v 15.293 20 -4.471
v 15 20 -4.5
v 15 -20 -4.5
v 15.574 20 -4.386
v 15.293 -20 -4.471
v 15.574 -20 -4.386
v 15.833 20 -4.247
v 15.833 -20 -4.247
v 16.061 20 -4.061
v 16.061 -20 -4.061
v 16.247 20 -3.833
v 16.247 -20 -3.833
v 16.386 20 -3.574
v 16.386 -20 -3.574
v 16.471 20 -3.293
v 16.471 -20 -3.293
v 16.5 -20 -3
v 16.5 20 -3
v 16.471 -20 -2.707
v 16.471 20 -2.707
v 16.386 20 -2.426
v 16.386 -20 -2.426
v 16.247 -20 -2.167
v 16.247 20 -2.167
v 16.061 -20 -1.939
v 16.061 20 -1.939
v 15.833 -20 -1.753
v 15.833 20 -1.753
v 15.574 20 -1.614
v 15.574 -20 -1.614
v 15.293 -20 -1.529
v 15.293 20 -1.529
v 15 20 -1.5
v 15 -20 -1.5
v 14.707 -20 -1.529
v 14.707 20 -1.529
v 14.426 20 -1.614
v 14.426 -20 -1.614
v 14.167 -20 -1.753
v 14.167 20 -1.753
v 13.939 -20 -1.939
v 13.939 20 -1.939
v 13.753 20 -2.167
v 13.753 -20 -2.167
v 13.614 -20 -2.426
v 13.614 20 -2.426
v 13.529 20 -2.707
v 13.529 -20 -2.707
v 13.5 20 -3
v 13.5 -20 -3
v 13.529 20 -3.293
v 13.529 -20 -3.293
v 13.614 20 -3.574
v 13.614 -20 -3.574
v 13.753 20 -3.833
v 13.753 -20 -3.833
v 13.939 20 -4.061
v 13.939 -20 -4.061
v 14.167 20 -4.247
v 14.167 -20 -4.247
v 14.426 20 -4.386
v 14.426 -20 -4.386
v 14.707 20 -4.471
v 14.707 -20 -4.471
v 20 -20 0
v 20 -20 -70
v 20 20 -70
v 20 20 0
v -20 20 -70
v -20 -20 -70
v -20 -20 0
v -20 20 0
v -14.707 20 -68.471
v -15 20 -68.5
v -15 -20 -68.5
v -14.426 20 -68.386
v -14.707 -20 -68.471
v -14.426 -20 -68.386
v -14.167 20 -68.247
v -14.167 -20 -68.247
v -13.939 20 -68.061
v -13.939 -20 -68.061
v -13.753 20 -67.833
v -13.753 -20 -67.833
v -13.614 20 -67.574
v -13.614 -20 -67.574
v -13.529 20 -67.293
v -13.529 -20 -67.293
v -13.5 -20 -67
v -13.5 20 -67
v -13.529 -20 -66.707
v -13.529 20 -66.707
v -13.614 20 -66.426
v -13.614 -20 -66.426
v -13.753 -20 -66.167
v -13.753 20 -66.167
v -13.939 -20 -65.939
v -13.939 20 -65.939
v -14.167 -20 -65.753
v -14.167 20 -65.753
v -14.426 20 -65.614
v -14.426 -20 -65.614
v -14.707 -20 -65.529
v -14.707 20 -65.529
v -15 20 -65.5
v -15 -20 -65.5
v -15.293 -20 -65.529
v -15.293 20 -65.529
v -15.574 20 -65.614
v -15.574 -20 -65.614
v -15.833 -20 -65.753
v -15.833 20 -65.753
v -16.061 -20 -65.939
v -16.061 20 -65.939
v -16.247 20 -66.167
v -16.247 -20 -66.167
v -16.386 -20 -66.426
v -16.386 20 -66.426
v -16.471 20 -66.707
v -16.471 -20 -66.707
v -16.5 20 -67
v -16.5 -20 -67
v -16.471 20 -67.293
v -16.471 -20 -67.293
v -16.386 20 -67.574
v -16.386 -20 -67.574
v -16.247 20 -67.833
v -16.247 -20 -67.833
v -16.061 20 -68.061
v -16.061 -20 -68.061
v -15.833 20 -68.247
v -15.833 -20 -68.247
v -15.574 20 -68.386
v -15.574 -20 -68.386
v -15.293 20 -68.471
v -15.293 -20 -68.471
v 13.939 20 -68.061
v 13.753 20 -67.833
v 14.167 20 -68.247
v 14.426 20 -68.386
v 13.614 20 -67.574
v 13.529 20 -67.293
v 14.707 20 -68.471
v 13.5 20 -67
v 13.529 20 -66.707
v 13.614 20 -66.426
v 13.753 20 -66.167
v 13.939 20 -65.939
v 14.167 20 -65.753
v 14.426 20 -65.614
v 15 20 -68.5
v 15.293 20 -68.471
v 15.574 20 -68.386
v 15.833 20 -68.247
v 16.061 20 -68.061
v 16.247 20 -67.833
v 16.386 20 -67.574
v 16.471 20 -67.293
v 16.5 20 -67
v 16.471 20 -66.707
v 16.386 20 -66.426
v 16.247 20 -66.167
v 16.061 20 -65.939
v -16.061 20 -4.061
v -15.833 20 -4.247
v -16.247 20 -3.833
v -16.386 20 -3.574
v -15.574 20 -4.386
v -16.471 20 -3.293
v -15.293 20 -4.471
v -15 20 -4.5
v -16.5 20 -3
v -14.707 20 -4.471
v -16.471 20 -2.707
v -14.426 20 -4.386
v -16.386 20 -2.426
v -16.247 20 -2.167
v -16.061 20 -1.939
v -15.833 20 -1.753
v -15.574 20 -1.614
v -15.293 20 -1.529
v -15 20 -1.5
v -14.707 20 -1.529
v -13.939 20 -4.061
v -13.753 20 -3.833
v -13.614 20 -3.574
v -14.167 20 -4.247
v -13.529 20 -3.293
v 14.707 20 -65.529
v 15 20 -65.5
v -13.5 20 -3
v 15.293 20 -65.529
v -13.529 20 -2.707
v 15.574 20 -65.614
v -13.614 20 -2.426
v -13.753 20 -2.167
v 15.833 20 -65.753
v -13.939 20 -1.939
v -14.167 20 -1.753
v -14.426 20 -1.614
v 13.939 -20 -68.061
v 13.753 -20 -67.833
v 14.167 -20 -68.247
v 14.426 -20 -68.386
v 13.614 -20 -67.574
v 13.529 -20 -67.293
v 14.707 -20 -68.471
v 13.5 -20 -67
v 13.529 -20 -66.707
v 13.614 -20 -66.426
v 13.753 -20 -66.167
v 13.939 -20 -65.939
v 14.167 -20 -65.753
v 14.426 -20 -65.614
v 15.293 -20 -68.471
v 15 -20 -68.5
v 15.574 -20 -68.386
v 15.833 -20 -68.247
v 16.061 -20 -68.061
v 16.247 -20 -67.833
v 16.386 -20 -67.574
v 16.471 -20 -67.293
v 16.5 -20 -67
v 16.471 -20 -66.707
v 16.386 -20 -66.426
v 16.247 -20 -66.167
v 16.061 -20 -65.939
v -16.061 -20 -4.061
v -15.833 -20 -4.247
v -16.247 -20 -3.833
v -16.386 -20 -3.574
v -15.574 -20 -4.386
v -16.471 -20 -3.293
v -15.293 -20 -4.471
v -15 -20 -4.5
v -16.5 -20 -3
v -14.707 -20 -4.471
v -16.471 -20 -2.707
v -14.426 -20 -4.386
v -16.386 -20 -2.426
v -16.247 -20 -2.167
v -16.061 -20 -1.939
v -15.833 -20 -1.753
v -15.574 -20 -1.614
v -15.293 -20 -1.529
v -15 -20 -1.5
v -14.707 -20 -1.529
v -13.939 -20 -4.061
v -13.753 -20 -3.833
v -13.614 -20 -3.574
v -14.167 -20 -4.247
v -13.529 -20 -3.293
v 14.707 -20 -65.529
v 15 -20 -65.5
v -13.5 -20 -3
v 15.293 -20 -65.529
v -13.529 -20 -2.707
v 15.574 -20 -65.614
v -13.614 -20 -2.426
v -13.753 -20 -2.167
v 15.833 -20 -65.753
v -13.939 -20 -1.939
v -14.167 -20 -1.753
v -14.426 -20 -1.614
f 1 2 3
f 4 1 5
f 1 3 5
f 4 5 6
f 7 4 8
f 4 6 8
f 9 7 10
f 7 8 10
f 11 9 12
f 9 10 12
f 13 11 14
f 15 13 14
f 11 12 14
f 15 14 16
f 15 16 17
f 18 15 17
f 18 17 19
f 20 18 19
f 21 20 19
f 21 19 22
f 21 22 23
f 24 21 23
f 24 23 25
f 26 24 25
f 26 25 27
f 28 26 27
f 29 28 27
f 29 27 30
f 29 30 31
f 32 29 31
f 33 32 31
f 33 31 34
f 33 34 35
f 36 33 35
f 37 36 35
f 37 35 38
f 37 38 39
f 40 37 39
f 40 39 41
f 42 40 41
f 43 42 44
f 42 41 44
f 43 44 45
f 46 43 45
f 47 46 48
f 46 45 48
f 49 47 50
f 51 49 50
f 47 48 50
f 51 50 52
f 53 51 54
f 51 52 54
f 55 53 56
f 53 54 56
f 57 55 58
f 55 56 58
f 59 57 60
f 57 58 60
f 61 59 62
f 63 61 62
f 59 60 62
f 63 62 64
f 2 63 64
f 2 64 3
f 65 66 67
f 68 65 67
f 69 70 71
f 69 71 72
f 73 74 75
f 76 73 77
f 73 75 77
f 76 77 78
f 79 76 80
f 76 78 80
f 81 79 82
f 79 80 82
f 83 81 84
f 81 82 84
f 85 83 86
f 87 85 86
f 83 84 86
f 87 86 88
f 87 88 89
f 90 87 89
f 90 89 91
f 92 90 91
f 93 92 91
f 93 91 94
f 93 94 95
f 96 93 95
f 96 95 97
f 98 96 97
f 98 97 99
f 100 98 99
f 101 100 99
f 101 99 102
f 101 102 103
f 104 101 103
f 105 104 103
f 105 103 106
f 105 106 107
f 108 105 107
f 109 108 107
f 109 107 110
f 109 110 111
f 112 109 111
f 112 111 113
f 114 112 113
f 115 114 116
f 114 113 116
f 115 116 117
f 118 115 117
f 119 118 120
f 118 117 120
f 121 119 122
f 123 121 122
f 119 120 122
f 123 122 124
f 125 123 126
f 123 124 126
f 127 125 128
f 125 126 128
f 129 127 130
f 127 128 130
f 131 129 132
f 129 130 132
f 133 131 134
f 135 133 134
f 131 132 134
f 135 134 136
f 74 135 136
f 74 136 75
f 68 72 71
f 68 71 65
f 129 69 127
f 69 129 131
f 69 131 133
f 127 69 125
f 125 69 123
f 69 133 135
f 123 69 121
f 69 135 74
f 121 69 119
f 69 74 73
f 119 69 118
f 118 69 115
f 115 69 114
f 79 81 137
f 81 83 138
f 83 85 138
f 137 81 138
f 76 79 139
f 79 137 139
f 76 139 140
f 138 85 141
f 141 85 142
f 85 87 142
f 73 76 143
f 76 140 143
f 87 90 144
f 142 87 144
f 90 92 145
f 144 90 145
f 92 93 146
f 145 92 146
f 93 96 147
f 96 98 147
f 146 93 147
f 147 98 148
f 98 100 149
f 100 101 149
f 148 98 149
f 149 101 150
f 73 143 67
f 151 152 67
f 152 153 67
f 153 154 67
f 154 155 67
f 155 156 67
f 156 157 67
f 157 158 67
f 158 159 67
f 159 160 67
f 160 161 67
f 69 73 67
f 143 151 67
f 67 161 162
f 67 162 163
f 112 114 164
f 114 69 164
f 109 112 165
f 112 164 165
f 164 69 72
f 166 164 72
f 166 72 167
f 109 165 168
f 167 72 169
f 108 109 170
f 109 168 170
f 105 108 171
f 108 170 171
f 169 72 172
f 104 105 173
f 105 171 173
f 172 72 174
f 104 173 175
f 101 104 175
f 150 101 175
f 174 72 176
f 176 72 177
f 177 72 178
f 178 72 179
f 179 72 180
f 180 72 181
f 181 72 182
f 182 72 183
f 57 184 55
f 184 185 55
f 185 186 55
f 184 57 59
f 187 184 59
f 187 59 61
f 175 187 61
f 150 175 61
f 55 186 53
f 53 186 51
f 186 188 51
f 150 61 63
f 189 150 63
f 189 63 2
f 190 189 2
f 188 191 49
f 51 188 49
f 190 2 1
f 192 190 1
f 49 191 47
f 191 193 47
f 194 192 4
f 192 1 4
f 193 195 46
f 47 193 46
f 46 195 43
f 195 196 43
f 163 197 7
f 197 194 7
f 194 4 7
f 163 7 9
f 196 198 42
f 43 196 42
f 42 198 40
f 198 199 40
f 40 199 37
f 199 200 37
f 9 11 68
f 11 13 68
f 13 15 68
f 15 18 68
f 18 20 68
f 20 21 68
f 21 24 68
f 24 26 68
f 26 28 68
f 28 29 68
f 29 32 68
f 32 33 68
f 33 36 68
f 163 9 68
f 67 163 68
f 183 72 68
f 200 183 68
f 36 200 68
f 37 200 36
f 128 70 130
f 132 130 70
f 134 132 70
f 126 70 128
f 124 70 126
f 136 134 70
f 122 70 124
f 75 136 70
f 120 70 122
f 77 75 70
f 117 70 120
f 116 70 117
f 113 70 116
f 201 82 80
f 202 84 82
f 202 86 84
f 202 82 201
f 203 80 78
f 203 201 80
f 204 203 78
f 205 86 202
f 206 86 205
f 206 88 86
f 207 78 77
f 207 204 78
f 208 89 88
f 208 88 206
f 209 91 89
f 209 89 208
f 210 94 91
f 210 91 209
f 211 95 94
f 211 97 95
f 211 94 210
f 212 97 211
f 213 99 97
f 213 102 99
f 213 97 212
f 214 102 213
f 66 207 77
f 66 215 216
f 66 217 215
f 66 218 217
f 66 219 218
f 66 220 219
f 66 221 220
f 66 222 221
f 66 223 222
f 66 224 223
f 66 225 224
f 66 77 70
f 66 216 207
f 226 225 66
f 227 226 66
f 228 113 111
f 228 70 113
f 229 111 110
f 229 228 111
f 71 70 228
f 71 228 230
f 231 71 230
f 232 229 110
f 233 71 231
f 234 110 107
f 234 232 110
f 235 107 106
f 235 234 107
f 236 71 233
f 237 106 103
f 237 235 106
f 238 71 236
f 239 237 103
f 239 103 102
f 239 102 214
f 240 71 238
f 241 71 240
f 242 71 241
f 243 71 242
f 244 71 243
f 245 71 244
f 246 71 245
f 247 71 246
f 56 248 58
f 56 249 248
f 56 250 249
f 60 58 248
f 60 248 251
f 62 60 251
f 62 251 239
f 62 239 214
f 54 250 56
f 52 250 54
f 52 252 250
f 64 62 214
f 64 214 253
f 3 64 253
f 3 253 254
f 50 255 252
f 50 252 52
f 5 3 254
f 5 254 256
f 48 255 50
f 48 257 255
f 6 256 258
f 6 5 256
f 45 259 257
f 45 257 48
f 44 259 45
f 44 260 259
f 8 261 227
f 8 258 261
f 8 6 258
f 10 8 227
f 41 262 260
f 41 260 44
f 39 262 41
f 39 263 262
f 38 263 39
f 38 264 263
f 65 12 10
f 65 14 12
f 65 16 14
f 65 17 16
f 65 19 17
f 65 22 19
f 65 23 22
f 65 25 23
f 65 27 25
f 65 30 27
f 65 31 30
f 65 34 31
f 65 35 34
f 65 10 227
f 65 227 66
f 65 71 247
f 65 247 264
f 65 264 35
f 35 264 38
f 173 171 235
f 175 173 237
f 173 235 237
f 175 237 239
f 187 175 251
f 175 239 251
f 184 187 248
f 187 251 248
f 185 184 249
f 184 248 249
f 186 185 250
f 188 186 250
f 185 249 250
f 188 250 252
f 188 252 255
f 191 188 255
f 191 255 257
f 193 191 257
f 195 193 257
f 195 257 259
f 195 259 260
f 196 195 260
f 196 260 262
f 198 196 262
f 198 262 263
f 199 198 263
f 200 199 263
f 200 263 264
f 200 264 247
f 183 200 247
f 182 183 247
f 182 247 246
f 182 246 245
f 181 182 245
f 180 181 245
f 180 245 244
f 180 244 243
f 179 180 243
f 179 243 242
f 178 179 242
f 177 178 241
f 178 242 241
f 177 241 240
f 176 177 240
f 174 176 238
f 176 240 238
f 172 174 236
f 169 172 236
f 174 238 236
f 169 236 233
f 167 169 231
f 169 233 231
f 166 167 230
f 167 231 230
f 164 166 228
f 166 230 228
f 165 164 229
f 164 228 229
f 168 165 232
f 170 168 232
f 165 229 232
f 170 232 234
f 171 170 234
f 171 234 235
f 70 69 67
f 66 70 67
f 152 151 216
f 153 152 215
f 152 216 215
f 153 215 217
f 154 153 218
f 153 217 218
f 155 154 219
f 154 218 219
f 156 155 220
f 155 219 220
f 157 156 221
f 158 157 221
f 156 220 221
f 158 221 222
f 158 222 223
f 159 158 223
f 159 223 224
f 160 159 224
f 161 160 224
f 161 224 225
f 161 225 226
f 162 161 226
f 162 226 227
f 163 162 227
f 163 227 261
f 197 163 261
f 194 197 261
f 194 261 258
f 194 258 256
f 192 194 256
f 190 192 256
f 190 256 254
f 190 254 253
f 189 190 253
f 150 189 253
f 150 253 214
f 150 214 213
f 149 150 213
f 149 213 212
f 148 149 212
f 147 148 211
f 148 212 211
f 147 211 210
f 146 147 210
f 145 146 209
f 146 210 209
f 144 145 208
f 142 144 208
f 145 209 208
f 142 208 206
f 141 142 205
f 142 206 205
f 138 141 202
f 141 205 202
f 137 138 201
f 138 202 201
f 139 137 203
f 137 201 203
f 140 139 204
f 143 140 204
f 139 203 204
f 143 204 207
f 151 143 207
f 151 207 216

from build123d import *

# Parameters (mm, degrees)
SKETCH_1_W            = 40
SKETCH_1_H            = 40
EXTRUDE_1_DEPTH       = 70
HOLE_WIZARD_3_0_3_1_D = 3


with BuildPart() as part:
    # 草图1 → 凸台-拉伸1 (new body)
    with BuildSketch(Plane.XY):
        Rectangle(SKETCH_1_W, SKETCH_1_H)
    extrude(amount=-EXTRUDE_1_DEPTH)

    # Ø3.0 (3) 直径孔1 (through all)
    with Locations(Plane(origin=(-15, 20, -67), x_dir=(0, 0, 1), z_dir=(0, 1, 0))):
        with Locations((0, 0), (0, 30), (64, 0), (64, 30)):
            Hole(HOLE_WIZARD_3_0_3_1_D / 2)


solid = part.part
